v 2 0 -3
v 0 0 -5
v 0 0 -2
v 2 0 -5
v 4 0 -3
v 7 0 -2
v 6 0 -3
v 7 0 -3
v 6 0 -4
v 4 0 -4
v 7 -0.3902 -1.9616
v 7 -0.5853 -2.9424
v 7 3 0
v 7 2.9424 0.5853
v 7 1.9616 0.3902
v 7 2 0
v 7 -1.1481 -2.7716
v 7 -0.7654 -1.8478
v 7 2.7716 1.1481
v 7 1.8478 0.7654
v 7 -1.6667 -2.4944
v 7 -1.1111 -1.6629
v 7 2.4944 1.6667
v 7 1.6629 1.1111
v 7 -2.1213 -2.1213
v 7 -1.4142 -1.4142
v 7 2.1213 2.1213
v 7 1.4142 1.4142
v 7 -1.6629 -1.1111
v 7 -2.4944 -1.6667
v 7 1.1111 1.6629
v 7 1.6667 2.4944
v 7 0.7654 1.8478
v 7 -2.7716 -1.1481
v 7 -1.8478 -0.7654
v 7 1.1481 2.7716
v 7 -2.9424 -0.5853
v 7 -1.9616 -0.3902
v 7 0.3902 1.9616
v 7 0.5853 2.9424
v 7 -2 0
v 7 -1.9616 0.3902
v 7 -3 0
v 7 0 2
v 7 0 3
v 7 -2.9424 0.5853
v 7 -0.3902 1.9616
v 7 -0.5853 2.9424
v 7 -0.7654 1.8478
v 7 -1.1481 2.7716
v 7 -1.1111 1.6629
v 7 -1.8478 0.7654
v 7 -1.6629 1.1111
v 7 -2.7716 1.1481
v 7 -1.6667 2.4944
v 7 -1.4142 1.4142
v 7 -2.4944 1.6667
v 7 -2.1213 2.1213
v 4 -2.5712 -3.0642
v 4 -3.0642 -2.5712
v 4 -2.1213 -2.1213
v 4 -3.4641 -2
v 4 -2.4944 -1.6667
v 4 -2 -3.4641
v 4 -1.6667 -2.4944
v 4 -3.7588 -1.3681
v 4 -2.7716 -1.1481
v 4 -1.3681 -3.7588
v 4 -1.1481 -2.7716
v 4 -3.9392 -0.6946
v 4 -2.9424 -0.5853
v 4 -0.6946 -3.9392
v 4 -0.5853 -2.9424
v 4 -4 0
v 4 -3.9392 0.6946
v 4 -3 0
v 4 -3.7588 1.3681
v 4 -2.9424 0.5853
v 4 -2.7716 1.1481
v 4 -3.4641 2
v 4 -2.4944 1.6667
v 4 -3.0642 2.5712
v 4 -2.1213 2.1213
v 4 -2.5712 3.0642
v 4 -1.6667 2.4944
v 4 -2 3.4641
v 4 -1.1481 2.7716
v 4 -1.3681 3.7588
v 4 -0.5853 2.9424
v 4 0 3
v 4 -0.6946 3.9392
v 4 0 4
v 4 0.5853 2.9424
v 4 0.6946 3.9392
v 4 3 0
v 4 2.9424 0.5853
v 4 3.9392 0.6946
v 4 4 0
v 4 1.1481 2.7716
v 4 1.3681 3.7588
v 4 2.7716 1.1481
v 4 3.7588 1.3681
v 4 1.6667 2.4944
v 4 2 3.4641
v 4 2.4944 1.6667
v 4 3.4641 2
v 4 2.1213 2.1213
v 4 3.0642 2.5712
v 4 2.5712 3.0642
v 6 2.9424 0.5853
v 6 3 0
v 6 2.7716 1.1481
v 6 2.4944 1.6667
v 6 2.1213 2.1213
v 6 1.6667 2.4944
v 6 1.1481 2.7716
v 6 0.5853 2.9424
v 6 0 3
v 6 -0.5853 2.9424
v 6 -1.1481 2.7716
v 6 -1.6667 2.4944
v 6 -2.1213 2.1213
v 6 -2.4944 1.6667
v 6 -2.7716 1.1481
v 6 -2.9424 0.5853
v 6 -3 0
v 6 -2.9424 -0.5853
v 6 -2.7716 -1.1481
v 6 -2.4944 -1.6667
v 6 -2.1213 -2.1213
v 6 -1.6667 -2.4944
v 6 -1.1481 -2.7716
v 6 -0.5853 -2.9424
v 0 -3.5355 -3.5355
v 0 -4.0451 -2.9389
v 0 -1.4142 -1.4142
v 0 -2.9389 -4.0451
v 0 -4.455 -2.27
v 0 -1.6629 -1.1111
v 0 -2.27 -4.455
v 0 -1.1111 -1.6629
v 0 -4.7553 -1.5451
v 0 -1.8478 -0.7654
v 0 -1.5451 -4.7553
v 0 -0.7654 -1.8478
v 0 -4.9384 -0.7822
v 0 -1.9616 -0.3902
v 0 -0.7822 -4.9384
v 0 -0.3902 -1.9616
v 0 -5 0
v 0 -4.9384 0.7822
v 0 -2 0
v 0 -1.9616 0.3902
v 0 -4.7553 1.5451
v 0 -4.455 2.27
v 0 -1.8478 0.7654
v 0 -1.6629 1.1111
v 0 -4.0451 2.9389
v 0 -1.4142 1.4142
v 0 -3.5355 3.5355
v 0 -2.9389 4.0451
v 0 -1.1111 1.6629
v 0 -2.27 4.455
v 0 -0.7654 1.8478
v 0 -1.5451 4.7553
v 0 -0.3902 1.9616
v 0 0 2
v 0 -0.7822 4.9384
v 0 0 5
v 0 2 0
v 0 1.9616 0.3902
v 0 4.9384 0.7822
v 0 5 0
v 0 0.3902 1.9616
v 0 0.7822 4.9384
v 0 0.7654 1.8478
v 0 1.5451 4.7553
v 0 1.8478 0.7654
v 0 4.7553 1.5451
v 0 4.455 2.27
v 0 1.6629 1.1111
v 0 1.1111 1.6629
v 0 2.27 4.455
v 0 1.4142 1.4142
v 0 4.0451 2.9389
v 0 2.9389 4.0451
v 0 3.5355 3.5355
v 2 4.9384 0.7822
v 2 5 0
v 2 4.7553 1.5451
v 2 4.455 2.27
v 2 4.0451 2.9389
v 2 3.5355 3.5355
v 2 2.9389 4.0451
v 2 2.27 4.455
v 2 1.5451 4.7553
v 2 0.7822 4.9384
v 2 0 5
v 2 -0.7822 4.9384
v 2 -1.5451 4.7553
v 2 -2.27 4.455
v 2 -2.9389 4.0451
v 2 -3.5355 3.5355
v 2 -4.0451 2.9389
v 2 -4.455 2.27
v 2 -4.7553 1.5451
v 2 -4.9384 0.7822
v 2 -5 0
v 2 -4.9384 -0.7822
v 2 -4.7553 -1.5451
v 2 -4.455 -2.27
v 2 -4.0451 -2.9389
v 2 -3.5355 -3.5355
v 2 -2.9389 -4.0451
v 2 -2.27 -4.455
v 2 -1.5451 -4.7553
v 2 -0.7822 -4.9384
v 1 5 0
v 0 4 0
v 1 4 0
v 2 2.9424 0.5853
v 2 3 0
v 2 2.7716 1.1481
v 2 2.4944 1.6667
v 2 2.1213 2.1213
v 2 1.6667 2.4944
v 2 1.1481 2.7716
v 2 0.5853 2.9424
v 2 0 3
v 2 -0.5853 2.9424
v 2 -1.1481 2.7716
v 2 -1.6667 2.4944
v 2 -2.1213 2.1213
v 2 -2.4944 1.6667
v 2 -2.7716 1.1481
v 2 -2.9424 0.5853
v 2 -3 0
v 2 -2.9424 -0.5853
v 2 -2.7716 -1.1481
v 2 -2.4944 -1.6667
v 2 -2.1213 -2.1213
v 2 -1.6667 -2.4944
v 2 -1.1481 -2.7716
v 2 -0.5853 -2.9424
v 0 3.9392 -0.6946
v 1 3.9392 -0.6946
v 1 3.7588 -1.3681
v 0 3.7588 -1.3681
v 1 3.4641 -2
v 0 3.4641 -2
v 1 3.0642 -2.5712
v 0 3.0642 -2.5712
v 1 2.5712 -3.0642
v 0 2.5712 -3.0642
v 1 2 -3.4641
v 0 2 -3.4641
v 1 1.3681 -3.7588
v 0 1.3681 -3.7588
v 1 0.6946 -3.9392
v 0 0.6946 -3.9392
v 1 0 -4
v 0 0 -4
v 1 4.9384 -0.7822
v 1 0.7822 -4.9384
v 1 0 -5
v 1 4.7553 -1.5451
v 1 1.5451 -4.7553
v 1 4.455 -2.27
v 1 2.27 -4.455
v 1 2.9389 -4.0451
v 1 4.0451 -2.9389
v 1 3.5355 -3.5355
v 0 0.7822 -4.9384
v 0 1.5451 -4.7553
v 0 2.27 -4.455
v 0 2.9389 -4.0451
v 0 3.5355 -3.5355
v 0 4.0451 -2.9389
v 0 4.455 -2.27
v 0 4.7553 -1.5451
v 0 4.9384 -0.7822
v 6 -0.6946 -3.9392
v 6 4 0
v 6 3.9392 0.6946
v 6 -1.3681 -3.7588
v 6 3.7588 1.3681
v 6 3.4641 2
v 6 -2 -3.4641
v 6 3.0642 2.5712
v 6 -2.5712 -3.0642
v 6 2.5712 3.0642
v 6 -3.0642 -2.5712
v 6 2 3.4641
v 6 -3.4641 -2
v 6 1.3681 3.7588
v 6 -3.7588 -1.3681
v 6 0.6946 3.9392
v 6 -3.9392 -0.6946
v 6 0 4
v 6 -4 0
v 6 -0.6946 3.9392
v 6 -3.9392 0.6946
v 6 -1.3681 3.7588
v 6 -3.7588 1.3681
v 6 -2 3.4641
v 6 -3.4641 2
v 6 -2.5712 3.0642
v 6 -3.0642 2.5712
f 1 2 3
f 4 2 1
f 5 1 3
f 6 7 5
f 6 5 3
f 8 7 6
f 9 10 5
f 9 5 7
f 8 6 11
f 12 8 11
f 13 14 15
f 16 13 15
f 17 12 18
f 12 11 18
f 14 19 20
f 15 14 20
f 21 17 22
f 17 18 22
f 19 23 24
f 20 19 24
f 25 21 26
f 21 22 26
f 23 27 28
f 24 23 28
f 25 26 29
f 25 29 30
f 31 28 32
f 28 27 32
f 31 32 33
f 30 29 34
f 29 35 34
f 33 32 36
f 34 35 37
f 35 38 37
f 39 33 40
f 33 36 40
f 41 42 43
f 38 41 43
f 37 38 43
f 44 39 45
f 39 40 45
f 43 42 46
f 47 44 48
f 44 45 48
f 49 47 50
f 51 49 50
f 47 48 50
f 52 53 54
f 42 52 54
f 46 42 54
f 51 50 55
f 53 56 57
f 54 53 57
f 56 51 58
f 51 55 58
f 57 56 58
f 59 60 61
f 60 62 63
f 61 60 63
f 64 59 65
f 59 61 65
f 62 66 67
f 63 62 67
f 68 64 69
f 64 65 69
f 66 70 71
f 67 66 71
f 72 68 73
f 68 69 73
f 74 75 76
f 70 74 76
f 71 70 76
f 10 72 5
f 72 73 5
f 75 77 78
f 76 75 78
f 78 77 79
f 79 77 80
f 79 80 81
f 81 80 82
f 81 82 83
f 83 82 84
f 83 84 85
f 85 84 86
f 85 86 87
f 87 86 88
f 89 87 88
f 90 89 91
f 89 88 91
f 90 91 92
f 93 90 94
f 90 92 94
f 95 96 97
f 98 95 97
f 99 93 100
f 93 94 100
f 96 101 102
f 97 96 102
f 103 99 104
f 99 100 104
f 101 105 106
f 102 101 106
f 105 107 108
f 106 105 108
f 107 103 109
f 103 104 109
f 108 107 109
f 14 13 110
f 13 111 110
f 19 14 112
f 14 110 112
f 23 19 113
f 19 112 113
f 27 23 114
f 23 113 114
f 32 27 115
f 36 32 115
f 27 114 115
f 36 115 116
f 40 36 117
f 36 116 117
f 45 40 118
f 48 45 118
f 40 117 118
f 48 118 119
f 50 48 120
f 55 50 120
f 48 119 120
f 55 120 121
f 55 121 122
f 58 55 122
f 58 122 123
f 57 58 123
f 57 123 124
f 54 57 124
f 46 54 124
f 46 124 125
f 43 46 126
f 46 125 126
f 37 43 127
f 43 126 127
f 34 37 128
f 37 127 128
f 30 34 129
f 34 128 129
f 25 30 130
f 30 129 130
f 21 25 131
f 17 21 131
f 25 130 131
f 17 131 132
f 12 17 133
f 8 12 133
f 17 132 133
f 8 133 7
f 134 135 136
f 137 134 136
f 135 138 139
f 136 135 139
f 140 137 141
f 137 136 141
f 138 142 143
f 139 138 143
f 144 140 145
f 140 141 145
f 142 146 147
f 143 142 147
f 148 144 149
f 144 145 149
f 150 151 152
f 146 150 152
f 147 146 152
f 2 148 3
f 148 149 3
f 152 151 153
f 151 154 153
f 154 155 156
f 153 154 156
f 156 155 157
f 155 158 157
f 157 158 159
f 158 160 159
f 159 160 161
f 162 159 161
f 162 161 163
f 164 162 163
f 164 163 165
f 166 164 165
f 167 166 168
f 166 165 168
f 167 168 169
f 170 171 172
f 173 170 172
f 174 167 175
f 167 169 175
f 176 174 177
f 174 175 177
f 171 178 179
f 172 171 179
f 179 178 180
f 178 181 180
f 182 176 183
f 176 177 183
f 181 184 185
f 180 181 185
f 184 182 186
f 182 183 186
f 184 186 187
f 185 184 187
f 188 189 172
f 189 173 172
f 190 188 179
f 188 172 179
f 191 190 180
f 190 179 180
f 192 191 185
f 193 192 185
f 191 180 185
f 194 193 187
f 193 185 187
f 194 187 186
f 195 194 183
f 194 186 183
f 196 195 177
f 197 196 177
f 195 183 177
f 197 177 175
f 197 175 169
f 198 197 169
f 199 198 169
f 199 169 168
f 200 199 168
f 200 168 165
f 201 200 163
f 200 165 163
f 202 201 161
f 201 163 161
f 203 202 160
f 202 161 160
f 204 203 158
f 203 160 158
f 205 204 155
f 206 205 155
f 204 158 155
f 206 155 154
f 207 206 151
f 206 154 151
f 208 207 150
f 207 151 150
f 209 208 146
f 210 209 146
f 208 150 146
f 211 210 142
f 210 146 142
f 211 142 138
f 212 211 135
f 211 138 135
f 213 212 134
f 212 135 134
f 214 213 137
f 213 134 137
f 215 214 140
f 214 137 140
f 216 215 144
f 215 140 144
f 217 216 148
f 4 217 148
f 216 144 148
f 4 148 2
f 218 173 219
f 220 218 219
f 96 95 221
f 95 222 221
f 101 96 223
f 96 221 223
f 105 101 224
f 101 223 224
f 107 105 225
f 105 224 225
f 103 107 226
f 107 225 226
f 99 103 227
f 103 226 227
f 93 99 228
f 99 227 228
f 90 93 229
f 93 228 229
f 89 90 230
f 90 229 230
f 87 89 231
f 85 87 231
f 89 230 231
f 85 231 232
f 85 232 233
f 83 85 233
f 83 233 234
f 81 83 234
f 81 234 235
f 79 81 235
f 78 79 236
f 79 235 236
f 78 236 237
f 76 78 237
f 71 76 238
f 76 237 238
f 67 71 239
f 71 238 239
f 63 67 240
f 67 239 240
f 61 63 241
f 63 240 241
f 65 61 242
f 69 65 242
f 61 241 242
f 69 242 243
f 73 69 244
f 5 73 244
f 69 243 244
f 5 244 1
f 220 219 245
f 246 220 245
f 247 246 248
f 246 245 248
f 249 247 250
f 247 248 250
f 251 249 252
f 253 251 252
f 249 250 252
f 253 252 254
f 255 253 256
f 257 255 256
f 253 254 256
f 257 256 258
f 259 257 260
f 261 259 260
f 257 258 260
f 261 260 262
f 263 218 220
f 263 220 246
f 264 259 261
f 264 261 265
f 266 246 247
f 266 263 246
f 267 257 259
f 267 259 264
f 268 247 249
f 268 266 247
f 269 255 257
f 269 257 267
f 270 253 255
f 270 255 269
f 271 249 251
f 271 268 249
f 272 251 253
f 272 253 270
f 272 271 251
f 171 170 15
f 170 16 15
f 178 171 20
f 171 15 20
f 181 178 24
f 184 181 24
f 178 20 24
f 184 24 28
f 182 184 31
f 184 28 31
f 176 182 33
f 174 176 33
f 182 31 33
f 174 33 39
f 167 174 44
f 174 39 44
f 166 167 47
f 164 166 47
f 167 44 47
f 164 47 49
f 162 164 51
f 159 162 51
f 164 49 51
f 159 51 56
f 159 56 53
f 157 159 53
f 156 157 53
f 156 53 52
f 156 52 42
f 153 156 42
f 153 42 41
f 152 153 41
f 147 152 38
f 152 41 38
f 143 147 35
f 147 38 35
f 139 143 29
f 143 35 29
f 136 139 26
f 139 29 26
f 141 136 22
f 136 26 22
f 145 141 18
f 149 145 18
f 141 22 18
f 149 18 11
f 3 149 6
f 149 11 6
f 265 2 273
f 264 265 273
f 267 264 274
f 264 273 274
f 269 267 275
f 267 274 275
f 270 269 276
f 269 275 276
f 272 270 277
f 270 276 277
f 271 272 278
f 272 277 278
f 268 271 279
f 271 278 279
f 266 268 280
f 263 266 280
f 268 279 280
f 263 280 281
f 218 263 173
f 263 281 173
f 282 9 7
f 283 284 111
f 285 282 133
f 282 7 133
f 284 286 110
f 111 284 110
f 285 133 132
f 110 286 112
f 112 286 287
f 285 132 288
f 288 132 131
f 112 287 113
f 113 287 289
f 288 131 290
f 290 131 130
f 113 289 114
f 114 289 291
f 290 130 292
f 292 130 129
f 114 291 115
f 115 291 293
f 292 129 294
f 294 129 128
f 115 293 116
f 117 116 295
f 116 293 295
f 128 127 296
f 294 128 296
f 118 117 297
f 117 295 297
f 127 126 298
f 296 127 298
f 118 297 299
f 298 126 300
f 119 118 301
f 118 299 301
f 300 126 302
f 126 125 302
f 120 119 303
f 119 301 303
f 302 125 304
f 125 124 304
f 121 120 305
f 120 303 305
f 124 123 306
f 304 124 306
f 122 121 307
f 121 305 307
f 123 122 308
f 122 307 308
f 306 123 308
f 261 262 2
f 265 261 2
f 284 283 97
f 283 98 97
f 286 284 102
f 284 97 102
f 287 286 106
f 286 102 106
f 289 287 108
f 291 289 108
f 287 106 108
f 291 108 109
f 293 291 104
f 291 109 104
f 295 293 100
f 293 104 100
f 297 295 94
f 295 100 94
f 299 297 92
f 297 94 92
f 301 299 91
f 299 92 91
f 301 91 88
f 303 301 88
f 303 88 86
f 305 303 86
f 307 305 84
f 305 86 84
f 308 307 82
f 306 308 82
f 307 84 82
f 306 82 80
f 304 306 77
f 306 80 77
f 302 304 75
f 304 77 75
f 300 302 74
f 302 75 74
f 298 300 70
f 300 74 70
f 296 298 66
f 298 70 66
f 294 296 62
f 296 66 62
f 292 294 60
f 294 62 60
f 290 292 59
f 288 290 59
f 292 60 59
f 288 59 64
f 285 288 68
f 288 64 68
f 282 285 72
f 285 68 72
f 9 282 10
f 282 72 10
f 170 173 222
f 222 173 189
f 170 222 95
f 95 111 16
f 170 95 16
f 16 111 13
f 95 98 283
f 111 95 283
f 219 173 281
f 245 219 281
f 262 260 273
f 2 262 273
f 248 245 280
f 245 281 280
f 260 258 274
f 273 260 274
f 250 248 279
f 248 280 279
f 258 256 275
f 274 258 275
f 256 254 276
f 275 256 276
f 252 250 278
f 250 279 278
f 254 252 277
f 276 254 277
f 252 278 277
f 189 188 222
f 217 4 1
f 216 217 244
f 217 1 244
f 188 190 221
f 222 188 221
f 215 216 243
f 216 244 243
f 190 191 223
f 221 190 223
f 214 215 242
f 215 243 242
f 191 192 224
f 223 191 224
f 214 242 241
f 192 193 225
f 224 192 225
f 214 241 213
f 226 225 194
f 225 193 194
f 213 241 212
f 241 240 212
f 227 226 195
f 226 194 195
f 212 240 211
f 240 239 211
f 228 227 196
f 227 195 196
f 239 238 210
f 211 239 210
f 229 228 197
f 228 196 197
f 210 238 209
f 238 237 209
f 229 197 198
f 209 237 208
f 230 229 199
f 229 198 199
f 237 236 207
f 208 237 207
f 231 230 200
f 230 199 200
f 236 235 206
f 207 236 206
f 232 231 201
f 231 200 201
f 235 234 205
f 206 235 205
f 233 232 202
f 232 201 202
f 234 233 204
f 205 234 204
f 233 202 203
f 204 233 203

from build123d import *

# Parameters (mm, degrees)
REVOLVE1_ANGLE      = 270
BOSS_EXTRUDE1_DEPTH = 1


with BuildPart() as part:
    # Sketch1 → Revolve1 (revolve)
    with BuildSketch(Plane.XY):
        Polygon((0, 5), (0, 2), (7, 2), (7, 3), (6, 3), (6, 4), (4, 4), (4, 3), (2, 3), (2, 5), align=None)
    revolve(axis=Axis((0, 0, 0), (1, 0, 0)), revolution_arc=REVOLVE1_ANGLE)


with BuildPart() as body_2:
    # Sketch2 → Boss-Extrude1 (new body)
    with BuildSketch(Plane.ZY):
        with BuildLine():
            Line((0, 5), (0, 4))
            ThreePointArc((0, 4), (-2.828427125, 2.828427125), (-4, 0))
            Line((-4, 0), (-5, 0))
            ThreePointArc((-5, 0), (-3.535533906, 3.535533906), (0, 5))
        make_face()
    extrude(amount=-BOSS_EXTRUDE1_DEPTH)


solid = Compound([part.part, body_2.part])
